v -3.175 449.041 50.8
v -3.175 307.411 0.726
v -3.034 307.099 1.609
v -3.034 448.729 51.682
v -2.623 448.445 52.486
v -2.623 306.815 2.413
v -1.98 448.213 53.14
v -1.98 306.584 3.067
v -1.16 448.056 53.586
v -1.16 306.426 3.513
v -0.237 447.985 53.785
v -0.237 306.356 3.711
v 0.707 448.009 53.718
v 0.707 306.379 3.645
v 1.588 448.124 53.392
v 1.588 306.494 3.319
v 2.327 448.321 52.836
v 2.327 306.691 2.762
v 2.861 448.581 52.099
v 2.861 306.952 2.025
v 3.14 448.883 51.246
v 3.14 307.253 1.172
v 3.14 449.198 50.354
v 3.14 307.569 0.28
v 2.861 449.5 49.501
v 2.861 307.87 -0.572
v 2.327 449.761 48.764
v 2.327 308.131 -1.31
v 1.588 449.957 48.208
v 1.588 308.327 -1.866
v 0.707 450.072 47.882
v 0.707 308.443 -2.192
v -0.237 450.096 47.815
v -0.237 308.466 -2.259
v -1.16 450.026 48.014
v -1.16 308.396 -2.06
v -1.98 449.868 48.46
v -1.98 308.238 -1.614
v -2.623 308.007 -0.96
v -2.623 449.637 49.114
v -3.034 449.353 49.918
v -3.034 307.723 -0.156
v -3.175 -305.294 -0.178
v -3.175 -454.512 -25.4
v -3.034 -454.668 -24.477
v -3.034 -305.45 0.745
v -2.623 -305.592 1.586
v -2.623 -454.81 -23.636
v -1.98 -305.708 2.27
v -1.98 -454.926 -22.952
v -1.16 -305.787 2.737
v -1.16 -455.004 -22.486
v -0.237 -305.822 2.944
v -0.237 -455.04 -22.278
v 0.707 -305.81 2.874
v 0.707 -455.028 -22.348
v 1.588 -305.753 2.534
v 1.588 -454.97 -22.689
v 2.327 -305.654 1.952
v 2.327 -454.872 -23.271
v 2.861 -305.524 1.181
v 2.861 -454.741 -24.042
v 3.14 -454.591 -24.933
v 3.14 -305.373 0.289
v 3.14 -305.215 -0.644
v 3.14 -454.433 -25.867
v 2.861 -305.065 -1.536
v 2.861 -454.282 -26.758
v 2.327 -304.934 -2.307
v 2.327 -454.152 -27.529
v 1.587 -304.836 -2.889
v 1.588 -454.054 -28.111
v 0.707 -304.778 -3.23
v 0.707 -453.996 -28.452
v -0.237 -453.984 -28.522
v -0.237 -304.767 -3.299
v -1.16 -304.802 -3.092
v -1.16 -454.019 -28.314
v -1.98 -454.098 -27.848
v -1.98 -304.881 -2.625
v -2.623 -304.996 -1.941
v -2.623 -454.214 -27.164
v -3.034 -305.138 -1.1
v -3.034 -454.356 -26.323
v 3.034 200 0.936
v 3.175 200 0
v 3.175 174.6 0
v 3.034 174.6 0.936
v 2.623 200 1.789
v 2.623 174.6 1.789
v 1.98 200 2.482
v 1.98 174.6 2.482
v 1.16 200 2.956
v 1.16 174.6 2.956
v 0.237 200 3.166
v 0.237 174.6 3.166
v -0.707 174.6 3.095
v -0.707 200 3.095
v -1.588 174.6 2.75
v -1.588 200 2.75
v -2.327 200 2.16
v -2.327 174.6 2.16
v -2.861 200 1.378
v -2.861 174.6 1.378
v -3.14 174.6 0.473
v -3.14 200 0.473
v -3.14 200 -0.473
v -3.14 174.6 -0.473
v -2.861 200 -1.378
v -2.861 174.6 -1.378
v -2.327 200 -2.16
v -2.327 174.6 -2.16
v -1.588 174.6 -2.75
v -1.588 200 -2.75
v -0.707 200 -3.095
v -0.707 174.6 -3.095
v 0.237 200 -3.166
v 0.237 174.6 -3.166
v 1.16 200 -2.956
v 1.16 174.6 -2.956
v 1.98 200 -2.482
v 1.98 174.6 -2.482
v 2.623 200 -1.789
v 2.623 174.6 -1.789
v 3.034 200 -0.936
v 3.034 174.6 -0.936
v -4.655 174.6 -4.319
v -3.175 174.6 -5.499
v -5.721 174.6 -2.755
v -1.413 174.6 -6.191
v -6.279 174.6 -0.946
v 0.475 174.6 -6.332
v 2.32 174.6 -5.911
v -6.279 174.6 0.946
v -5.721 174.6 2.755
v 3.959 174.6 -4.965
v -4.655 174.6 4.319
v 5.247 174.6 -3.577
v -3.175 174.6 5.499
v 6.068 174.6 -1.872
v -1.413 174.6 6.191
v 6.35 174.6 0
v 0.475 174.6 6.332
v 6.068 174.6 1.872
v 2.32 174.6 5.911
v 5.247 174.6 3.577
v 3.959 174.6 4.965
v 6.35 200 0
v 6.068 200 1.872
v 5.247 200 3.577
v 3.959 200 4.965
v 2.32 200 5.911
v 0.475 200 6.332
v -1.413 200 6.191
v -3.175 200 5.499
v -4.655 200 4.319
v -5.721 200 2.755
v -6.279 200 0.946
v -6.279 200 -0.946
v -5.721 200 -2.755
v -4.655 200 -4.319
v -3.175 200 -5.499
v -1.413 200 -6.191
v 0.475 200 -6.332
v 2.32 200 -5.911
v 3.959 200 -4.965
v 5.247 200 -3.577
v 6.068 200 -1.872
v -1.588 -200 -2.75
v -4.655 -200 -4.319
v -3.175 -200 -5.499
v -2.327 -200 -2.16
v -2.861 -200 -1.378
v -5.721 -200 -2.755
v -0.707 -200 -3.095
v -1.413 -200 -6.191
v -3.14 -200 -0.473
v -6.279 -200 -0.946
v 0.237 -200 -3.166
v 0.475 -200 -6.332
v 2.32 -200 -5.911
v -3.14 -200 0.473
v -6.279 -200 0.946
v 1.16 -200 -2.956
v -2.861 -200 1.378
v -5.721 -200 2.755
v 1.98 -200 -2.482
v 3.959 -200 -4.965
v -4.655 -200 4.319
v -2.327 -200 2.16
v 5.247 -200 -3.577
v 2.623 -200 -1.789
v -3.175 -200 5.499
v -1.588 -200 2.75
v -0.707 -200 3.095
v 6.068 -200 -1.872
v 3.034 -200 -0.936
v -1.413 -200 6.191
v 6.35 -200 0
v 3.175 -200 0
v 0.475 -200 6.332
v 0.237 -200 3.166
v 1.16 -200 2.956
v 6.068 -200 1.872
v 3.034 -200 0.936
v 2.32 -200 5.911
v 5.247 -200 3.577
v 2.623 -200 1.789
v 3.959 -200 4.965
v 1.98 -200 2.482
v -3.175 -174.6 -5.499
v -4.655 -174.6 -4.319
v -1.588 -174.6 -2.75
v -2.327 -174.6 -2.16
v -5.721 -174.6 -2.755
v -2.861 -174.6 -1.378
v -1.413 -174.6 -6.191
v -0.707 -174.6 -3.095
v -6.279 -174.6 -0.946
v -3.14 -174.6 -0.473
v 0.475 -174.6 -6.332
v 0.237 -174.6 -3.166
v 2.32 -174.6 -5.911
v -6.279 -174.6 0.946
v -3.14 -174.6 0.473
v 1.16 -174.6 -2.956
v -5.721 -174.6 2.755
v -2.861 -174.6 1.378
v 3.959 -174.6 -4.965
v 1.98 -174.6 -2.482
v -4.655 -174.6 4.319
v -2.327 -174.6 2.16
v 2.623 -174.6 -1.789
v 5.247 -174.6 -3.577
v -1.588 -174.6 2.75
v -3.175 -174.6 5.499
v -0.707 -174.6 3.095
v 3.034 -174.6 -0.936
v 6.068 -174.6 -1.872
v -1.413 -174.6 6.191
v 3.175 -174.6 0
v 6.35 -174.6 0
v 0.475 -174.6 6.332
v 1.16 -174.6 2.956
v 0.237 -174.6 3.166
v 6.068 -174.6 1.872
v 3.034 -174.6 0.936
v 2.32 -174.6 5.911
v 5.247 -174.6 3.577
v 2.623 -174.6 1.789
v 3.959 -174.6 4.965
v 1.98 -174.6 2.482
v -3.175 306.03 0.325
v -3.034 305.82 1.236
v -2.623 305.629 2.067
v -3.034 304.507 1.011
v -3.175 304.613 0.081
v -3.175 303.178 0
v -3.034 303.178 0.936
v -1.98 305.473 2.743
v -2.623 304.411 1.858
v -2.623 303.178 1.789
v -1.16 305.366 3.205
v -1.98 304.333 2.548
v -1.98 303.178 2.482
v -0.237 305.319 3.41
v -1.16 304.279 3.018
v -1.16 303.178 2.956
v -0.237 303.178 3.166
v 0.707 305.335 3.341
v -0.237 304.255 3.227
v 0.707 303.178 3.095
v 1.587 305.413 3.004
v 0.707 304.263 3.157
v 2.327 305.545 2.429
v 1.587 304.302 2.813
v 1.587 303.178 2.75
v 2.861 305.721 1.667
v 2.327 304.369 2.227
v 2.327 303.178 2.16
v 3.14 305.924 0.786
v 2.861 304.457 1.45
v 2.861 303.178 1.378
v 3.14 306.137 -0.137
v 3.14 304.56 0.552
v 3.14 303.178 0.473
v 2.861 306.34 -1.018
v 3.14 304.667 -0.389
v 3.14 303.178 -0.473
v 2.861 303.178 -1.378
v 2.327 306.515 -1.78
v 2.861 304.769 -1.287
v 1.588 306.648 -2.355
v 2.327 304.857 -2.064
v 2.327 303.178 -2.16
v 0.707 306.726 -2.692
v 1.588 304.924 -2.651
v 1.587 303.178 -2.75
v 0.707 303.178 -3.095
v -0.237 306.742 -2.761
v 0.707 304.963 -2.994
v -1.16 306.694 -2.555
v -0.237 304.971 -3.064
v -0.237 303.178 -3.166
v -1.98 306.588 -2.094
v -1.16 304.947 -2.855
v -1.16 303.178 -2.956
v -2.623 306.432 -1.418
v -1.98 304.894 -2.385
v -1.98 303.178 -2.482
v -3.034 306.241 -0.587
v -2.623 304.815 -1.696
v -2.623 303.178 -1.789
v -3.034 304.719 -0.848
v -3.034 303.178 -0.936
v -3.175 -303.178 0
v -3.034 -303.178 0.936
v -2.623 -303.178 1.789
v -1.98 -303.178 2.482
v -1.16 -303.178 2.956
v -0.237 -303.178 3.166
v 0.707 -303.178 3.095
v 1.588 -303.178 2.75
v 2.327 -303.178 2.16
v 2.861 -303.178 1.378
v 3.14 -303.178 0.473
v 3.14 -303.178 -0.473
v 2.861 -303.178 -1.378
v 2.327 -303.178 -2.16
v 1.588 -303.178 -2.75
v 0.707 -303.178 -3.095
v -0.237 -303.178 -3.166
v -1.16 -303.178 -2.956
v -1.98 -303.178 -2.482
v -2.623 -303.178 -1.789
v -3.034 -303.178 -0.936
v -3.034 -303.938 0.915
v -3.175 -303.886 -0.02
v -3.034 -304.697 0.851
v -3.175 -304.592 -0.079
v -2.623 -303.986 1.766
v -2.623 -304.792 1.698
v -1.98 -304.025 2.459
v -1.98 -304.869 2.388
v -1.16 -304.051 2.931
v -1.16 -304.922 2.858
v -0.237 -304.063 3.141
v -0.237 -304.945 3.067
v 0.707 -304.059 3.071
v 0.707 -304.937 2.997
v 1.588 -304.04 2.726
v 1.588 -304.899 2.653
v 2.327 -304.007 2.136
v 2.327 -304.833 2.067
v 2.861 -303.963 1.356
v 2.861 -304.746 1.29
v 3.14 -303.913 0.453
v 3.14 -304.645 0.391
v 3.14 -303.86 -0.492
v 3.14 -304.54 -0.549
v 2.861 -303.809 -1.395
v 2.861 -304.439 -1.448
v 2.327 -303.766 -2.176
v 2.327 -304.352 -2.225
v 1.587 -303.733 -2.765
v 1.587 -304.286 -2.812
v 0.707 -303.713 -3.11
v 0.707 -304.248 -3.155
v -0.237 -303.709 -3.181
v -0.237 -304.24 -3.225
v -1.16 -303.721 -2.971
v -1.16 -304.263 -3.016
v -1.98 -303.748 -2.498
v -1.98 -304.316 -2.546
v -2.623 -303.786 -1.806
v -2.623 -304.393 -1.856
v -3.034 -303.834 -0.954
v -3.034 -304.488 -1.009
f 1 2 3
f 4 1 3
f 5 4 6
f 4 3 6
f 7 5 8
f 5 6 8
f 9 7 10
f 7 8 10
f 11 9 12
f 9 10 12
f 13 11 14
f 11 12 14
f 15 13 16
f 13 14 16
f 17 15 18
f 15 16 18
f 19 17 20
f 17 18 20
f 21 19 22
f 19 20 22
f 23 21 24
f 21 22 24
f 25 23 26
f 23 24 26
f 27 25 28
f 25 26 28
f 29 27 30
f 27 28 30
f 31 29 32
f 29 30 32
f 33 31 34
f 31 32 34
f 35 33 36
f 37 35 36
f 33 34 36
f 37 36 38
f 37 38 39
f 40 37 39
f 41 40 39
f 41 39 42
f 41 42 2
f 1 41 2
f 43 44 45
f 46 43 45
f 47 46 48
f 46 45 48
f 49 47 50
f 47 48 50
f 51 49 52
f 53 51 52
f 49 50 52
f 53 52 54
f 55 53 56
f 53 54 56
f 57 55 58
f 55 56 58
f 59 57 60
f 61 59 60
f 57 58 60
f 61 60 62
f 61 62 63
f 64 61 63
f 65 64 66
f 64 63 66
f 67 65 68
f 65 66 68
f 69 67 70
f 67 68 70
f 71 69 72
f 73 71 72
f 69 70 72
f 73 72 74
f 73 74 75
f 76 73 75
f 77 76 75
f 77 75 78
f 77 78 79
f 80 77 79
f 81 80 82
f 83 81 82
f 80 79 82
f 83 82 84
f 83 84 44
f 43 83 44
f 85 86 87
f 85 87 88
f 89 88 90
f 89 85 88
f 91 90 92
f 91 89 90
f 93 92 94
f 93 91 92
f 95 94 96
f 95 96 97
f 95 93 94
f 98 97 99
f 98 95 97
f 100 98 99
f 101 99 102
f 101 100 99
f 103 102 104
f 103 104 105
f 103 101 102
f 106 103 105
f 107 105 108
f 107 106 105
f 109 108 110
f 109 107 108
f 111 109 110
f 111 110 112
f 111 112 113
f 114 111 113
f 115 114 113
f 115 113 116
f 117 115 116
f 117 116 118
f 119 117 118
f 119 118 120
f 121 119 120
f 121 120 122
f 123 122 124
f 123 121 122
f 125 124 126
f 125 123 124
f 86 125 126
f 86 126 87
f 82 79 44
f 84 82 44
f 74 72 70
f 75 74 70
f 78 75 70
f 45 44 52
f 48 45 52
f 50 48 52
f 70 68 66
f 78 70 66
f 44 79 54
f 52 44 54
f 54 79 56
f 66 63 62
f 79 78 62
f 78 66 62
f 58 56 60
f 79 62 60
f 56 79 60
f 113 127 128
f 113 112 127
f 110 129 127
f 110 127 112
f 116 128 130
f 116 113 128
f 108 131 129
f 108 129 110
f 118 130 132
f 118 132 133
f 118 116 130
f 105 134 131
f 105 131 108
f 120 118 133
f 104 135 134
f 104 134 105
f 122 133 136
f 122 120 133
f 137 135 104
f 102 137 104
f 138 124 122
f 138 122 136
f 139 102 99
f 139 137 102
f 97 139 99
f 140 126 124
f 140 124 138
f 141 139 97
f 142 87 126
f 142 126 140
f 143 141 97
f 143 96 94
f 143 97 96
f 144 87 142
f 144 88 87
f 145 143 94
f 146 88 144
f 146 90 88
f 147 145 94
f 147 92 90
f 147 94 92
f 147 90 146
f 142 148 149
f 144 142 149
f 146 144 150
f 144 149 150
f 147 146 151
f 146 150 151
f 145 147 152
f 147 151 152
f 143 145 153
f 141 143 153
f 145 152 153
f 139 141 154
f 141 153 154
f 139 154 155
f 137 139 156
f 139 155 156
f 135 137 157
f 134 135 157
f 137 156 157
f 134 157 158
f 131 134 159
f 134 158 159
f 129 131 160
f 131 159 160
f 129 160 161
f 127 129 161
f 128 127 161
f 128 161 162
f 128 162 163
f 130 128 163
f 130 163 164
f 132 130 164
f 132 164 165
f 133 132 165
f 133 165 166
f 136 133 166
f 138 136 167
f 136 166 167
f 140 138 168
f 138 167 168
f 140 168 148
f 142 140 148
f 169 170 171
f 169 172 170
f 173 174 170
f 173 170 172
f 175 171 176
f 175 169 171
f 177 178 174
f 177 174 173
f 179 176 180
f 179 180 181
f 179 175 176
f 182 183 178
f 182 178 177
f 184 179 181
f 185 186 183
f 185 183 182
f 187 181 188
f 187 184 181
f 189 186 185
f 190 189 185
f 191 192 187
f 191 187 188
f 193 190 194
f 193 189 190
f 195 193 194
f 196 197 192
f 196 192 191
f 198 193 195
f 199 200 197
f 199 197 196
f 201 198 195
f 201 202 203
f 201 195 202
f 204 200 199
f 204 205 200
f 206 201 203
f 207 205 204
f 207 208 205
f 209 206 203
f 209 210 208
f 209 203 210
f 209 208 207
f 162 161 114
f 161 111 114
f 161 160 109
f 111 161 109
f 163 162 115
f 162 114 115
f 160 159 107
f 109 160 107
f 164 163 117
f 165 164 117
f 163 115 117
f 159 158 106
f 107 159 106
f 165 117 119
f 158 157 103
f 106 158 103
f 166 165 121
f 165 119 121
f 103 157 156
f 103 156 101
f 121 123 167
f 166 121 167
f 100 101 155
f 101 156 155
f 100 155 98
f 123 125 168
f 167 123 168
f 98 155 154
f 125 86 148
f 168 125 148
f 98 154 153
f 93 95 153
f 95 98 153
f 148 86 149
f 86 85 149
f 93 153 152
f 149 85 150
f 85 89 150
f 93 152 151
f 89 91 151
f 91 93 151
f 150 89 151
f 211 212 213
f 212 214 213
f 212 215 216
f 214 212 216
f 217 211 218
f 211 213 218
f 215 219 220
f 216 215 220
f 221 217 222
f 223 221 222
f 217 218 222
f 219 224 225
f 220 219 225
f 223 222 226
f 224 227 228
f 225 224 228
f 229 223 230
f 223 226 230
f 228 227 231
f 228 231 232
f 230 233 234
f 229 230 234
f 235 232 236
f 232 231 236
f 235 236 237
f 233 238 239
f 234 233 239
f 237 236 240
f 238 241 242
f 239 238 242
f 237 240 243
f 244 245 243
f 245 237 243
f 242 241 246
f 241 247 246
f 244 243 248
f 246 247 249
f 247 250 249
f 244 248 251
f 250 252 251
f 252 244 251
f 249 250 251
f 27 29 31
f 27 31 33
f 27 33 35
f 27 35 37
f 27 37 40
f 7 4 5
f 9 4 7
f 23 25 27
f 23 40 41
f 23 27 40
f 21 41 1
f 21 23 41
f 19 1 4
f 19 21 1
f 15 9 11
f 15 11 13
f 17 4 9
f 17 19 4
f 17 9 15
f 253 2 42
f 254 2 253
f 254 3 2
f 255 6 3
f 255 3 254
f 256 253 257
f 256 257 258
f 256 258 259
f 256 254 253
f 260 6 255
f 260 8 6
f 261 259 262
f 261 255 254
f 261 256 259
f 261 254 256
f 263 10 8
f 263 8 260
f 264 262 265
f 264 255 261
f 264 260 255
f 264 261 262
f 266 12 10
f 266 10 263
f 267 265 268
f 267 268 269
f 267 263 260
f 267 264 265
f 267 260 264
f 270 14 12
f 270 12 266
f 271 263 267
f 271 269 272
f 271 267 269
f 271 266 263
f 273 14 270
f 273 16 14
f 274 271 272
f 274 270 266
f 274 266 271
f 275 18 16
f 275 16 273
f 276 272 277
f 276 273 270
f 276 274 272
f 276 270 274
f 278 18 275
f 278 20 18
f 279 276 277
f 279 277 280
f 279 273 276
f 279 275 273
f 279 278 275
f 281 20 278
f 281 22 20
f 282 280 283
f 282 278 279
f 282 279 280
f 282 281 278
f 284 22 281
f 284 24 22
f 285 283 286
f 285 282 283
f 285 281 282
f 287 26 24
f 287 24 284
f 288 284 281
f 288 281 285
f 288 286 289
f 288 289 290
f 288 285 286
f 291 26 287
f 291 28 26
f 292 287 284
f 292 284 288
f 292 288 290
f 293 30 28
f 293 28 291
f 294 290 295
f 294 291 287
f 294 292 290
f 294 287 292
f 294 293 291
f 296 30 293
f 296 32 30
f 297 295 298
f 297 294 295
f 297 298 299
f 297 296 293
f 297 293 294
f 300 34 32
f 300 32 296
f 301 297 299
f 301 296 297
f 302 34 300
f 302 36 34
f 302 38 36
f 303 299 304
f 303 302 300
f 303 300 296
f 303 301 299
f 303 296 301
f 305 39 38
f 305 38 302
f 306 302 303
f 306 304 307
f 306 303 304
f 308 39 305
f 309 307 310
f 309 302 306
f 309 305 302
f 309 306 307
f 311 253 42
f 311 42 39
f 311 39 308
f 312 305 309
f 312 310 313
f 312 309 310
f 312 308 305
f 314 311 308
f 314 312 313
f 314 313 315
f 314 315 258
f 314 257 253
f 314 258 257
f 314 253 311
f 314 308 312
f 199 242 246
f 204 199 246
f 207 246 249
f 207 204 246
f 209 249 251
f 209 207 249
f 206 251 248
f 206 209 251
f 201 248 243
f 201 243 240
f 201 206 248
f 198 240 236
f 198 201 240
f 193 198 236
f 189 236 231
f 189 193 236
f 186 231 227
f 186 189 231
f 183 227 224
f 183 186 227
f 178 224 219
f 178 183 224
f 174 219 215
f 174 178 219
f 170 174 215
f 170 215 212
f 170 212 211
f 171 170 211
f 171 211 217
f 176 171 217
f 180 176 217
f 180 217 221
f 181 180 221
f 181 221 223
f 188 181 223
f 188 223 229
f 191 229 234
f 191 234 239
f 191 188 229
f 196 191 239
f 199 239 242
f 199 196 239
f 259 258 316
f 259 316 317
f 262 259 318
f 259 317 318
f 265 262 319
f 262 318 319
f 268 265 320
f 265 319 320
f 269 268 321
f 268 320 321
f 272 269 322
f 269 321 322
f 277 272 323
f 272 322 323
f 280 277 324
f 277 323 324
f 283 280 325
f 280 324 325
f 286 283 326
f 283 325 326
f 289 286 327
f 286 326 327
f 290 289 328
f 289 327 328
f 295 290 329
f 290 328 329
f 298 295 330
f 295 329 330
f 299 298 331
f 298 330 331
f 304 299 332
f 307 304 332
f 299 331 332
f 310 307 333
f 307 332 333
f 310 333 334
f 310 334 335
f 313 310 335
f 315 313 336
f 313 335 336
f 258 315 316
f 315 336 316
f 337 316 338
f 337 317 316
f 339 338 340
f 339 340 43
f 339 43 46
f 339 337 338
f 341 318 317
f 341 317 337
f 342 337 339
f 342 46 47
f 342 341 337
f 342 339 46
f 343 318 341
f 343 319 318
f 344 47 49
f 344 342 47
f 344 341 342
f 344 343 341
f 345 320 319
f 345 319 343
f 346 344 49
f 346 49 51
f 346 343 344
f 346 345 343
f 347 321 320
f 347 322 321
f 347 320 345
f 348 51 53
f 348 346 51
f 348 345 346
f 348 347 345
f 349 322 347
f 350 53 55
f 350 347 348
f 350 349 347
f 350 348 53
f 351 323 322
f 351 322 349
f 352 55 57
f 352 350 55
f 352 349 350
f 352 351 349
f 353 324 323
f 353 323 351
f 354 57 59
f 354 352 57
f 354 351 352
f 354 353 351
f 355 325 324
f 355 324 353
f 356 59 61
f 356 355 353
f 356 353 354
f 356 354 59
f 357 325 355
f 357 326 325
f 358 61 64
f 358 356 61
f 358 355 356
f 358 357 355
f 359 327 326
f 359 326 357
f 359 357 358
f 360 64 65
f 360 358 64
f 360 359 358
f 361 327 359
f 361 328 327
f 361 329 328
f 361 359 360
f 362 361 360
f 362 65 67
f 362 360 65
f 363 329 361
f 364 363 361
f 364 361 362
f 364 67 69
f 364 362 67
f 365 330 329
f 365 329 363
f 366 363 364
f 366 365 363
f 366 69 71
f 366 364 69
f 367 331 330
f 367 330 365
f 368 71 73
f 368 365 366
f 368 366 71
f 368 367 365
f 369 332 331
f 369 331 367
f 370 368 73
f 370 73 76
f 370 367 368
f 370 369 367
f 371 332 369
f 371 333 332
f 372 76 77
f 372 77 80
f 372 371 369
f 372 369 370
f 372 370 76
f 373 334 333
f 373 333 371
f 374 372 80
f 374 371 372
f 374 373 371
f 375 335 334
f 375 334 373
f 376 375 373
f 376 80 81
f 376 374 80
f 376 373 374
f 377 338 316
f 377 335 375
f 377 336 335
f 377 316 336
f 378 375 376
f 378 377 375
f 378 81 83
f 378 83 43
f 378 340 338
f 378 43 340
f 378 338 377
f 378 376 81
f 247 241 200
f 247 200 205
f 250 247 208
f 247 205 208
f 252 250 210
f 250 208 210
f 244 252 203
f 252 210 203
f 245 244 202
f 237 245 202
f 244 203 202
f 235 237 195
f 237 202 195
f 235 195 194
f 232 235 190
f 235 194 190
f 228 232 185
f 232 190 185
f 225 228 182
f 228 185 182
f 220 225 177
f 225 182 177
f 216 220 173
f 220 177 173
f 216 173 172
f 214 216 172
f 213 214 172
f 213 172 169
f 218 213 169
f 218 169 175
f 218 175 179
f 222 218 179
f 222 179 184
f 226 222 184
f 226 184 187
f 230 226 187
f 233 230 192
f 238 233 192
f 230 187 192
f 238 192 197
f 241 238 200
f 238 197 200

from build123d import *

# Parameters (mm, degrees)
F2_R     = 3.175
F4_R     = 6.35
F4_R_2   = 3.175
F5_DEPTH = 25.4


with BuildPart() as f3:
    # F3: sweep along a path in F0
    with BuildLine(Plane.YZ) as f3_path:
        Line((449.040692, 50.8), (307.410952, 0.726325))
        ThreePointArc((307.410952, 0.726325), (305.325214, 0.182898), (303.177619, 0))
        Line((303.177619, 0), (-303.177619, 0))
        ThreePointArc((-303.177619, 0), (-304.239672, -0.044486), (-305.294286, -0.177631))
        Line((-305.294286, -0.177631), (-454.511832, -25.4))
    # F2 (on face) → F3 (sweep)
    with BuildSketch(Plane(origin=(0, 415.112182, 146.764319), x_dir=(-1, 0, 0), z_dir=(0, 0.942809, 0.333333))):
        with Locations((0, -101.785531)):
            Circle(F2_R)
    sweep(path=f3_path.line)


with BuildPart() as f5:
    # F4 (on Front) → F5 (new body)
    with BuildSketch(Plane.XZ):
        Circle(F4_R)
        Circle(F4_R_2, mode=Mode.SUBTRACT)
    extrude(amount=F5_DEPTH)


with BuildPart() as f5_1:
    # F6: moved
    add(f5.part.moved(Location((0, 200, 0))))


with BuildPart() as f7_1:
    # F7: instance of F5
    add(f5_1.part.mirror(Plane.XZ))


solid = Compound([f3.part, f5_1.part, f7_1.part])
